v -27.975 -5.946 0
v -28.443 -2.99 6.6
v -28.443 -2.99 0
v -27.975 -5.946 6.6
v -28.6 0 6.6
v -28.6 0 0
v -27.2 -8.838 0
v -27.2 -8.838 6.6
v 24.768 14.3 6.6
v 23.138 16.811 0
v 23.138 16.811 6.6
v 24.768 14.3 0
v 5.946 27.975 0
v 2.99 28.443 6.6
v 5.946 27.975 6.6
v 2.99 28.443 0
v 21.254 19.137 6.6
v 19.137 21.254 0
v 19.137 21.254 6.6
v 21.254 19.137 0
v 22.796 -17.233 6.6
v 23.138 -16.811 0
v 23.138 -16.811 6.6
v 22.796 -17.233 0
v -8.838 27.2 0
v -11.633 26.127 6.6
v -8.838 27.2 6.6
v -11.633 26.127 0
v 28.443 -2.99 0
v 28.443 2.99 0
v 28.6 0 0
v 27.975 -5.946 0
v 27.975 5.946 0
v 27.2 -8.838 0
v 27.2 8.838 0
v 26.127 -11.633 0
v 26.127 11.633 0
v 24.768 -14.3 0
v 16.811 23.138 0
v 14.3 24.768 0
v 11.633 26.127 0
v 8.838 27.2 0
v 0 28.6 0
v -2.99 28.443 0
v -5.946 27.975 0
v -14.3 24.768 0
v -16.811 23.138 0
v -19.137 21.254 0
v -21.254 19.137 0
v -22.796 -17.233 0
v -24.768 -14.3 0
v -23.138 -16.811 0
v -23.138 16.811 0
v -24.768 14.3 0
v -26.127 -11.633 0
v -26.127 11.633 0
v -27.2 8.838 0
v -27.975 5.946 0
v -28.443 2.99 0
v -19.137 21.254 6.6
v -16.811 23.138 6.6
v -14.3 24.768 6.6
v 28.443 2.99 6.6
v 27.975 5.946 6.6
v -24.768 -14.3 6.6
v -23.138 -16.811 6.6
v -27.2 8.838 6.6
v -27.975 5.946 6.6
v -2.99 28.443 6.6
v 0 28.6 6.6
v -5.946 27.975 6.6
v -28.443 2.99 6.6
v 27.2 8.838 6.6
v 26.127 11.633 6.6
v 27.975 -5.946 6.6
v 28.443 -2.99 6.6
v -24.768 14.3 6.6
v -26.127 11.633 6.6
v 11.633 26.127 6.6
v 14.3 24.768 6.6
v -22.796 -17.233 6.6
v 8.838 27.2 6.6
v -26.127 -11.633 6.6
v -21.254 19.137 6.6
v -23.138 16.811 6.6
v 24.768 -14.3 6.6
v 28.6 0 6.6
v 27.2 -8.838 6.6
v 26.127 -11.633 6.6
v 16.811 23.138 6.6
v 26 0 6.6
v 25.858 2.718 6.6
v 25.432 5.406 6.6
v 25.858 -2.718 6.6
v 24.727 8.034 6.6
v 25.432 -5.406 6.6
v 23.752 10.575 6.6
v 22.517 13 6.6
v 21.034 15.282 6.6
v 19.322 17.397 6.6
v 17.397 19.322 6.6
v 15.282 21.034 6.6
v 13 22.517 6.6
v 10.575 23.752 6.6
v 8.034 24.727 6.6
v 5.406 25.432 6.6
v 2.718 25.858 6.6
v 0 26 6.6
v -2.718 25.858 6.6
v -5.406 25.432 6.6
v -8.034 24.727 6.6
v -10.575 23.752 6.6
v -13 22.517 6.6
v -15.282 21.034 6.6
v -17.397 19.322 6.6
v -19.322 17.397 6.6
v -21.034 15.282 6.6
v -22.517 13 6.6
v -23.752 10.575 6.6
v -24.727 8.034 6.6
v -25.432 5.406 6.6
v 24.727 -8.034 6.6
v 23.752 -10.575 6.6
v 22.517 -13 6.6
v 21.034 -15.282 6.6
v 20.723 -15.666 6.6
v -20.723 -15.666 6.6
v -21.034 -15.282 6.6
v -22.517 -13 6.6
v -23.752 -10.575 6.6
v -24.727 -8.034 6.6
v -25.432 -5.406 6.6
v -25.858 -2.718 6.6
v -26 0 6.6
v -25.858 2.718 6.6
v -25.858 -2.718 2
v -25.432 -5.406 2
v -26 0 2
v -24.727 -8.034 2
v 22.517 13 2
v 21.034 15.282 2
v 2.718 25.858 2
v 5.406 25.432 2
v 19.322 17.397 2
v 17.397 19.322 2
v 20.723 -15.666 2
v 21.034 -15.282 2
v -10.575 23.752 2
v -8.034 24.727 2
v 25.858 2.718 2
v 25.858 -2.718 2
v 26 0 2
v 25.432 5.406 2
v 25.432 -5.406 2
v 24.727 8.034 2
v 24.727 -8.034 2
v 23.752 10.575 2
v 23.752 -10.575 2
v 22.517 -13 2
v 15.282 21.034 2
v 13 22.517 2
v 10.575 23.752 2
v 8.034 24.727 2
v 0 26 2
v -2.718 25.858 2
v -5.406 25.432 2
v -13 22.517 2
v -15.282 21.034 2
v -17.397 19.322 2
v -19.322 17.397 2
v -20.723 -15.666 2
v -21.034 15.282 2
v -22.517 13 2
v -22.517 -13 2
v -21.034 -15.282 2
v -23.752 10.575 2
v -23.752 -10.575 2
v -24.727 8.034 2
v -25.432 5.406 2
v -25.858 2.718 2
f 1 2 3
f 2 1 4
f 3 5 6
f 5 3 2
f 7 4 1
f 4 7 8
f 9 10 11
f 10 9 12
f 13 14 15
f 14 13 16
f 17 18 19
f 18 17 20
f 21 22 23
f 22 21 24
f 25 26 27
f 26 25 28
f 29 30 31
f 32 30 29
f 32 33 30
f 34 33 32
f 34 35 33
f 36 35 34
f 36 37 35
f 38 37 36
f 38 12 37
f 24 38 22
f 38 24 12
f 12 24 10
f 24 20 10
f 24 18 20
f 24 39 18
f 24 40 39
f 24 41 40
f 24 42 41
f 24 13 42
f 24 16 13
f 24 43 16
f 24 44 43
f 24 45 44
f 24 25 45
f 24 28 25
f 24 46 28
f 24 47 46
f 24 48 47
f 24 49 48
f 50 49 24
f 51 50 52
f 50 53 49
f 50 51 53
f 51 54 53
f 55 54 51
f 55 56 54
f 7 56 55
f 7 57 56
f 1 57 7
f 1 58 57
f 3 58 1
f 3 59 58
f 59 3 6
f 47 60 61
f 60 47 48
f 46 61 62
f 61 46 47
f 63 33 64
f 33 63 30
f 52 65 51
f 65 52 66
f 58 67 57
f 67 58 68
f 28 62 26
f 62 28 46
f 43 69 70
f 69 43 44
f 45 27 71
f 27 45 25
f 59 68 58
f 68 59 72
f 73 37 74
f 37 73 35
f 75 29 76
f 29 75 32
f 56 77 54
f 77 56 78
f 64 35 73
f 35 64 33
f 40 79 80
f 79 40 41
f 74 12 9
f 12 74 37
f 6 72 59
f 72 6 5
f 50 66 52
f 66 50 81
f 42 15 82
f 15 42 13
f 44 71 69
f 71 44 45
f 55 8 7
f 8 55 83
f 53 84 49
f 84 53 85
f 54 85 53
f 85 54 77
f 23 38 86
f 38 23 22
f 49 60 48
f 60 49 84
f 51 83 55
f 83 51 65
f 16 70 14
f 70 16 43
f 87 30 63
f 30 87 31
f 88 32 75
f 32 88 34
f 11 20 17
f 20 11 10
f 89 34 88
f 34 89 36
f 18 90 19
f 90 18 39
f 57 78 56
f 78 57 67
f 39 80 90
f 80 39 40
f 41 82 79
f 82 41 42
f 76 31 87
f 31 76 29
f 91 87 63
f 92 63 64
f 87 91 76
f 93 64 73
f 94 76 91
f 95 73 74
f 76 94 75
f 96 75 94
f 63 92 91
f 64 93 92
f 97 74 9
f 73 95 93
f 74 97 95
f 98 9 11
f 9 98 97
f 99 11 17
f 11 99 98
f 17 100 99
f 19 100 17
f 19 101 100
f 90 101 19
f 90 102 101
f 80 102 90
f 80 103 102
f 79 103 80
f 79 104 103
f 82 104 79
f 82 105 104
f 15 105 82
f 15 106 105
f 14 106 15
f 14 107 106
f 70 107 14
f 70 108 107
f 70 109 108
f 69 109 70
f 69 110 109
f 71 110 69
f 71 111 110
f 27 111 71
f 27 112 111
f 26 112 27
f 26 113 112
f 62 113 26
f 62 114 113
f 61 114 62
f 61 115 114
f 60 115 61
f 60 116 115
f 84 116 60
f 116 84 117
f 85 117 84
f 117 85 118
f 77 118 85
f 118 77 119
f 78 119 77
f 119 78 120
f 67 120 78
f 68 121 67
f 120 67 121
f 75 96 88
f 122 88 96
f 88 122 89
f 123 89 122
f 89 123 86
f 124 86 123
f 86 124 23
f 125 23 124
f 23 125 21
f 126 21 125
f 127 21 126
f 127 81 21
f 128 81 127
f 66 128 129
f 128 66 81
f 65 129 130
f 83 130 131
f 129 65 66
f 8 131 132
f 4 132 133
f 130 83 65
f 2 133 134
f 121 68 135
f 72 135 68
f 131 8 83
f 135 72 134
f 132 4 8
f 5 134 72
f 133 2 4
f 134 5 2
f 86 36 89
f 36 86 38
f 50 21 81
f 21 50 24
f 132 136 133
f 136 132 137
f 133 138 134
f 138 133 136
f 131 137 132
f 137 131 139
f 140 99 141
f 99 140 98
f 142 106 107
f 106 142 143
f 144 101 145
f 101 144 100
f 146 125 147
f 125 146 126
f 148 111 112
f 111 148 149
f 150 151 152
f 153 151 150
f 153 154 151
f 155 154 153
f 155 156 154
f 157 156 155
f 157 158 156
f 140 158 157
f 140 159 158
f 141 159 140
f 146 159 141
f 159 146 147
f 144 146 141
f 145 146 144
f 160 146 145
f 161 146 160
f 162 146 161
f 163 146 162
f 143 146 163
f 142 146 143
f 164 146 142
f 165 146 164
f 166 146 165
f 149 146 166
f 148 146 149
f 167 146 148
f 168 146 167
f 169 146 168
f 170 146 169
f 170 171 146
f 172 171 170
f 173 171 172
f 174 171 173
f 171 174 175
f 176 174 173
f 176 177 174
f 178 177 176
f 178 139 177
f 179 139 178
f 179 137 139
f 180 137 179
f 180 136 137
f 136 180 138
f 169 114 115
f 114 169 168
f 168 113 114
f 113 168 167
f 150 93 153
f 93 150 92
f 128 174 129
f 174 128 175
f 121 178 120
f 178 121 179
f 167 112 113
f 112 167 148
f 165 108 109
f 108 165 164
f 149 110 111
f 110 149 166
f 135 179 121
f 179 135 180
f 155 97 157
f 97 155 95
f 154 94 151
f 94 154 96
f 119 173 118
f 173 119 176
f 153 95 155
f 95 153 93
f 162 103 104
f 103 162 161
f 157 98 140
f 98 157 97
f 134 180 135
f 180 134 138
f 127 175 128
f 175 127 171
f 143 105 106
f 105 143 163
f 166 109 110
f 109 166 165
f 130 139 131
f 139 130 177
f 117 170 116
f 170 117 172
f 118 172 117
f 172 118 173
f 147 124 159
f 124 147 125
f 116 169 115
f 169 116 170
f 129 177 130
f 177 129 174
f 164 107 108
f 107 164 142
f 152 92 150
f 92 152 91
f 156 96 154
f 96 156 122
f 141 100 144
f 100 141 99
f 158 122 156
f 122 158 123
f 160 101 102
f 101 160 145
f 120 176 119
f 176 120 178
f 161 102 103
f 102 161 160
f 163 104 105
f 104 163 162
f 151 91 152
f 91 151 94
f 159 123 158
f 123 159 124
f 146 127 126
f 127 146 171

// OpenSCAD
$fn=60;


eye_base_cut=41.5;
eye_base_diameter=52;
eye_base_height=6; // minus plate height
plate_height=2;

eye_base_cut=26-26*cos(106/2);

// 2*eye_base_radius*sin(106/2) ~ 41.5
// 2*eye_base_radiu/41.5 ~ 1/sin(106/2)
// 41.5/2eye_base_radius ~ sin(106/2)
// asin(41.5/eye_base_diameter)*2 = angle

eye_base_cut=26-26*cos(asin(41.5/52));

echo(eye_base_cut);

module eye_base()
{
    difference()
    {
        cylinder(d=eye_base_diameter, h=eye_base_height);
        translate([-eye_base_diameter/2,eye_base_diameter/2-eye_base_cut,0])
            cube([eye_base_diameter,eye_base_diameter,eye_base_height]);


    }
}



difference()
{
    scale(1.1) rotate(180,[0,0,1]) eye_base();
    translate([0,0,plate_height])  rotate(180,[0,0,1]) eye_base();
}
